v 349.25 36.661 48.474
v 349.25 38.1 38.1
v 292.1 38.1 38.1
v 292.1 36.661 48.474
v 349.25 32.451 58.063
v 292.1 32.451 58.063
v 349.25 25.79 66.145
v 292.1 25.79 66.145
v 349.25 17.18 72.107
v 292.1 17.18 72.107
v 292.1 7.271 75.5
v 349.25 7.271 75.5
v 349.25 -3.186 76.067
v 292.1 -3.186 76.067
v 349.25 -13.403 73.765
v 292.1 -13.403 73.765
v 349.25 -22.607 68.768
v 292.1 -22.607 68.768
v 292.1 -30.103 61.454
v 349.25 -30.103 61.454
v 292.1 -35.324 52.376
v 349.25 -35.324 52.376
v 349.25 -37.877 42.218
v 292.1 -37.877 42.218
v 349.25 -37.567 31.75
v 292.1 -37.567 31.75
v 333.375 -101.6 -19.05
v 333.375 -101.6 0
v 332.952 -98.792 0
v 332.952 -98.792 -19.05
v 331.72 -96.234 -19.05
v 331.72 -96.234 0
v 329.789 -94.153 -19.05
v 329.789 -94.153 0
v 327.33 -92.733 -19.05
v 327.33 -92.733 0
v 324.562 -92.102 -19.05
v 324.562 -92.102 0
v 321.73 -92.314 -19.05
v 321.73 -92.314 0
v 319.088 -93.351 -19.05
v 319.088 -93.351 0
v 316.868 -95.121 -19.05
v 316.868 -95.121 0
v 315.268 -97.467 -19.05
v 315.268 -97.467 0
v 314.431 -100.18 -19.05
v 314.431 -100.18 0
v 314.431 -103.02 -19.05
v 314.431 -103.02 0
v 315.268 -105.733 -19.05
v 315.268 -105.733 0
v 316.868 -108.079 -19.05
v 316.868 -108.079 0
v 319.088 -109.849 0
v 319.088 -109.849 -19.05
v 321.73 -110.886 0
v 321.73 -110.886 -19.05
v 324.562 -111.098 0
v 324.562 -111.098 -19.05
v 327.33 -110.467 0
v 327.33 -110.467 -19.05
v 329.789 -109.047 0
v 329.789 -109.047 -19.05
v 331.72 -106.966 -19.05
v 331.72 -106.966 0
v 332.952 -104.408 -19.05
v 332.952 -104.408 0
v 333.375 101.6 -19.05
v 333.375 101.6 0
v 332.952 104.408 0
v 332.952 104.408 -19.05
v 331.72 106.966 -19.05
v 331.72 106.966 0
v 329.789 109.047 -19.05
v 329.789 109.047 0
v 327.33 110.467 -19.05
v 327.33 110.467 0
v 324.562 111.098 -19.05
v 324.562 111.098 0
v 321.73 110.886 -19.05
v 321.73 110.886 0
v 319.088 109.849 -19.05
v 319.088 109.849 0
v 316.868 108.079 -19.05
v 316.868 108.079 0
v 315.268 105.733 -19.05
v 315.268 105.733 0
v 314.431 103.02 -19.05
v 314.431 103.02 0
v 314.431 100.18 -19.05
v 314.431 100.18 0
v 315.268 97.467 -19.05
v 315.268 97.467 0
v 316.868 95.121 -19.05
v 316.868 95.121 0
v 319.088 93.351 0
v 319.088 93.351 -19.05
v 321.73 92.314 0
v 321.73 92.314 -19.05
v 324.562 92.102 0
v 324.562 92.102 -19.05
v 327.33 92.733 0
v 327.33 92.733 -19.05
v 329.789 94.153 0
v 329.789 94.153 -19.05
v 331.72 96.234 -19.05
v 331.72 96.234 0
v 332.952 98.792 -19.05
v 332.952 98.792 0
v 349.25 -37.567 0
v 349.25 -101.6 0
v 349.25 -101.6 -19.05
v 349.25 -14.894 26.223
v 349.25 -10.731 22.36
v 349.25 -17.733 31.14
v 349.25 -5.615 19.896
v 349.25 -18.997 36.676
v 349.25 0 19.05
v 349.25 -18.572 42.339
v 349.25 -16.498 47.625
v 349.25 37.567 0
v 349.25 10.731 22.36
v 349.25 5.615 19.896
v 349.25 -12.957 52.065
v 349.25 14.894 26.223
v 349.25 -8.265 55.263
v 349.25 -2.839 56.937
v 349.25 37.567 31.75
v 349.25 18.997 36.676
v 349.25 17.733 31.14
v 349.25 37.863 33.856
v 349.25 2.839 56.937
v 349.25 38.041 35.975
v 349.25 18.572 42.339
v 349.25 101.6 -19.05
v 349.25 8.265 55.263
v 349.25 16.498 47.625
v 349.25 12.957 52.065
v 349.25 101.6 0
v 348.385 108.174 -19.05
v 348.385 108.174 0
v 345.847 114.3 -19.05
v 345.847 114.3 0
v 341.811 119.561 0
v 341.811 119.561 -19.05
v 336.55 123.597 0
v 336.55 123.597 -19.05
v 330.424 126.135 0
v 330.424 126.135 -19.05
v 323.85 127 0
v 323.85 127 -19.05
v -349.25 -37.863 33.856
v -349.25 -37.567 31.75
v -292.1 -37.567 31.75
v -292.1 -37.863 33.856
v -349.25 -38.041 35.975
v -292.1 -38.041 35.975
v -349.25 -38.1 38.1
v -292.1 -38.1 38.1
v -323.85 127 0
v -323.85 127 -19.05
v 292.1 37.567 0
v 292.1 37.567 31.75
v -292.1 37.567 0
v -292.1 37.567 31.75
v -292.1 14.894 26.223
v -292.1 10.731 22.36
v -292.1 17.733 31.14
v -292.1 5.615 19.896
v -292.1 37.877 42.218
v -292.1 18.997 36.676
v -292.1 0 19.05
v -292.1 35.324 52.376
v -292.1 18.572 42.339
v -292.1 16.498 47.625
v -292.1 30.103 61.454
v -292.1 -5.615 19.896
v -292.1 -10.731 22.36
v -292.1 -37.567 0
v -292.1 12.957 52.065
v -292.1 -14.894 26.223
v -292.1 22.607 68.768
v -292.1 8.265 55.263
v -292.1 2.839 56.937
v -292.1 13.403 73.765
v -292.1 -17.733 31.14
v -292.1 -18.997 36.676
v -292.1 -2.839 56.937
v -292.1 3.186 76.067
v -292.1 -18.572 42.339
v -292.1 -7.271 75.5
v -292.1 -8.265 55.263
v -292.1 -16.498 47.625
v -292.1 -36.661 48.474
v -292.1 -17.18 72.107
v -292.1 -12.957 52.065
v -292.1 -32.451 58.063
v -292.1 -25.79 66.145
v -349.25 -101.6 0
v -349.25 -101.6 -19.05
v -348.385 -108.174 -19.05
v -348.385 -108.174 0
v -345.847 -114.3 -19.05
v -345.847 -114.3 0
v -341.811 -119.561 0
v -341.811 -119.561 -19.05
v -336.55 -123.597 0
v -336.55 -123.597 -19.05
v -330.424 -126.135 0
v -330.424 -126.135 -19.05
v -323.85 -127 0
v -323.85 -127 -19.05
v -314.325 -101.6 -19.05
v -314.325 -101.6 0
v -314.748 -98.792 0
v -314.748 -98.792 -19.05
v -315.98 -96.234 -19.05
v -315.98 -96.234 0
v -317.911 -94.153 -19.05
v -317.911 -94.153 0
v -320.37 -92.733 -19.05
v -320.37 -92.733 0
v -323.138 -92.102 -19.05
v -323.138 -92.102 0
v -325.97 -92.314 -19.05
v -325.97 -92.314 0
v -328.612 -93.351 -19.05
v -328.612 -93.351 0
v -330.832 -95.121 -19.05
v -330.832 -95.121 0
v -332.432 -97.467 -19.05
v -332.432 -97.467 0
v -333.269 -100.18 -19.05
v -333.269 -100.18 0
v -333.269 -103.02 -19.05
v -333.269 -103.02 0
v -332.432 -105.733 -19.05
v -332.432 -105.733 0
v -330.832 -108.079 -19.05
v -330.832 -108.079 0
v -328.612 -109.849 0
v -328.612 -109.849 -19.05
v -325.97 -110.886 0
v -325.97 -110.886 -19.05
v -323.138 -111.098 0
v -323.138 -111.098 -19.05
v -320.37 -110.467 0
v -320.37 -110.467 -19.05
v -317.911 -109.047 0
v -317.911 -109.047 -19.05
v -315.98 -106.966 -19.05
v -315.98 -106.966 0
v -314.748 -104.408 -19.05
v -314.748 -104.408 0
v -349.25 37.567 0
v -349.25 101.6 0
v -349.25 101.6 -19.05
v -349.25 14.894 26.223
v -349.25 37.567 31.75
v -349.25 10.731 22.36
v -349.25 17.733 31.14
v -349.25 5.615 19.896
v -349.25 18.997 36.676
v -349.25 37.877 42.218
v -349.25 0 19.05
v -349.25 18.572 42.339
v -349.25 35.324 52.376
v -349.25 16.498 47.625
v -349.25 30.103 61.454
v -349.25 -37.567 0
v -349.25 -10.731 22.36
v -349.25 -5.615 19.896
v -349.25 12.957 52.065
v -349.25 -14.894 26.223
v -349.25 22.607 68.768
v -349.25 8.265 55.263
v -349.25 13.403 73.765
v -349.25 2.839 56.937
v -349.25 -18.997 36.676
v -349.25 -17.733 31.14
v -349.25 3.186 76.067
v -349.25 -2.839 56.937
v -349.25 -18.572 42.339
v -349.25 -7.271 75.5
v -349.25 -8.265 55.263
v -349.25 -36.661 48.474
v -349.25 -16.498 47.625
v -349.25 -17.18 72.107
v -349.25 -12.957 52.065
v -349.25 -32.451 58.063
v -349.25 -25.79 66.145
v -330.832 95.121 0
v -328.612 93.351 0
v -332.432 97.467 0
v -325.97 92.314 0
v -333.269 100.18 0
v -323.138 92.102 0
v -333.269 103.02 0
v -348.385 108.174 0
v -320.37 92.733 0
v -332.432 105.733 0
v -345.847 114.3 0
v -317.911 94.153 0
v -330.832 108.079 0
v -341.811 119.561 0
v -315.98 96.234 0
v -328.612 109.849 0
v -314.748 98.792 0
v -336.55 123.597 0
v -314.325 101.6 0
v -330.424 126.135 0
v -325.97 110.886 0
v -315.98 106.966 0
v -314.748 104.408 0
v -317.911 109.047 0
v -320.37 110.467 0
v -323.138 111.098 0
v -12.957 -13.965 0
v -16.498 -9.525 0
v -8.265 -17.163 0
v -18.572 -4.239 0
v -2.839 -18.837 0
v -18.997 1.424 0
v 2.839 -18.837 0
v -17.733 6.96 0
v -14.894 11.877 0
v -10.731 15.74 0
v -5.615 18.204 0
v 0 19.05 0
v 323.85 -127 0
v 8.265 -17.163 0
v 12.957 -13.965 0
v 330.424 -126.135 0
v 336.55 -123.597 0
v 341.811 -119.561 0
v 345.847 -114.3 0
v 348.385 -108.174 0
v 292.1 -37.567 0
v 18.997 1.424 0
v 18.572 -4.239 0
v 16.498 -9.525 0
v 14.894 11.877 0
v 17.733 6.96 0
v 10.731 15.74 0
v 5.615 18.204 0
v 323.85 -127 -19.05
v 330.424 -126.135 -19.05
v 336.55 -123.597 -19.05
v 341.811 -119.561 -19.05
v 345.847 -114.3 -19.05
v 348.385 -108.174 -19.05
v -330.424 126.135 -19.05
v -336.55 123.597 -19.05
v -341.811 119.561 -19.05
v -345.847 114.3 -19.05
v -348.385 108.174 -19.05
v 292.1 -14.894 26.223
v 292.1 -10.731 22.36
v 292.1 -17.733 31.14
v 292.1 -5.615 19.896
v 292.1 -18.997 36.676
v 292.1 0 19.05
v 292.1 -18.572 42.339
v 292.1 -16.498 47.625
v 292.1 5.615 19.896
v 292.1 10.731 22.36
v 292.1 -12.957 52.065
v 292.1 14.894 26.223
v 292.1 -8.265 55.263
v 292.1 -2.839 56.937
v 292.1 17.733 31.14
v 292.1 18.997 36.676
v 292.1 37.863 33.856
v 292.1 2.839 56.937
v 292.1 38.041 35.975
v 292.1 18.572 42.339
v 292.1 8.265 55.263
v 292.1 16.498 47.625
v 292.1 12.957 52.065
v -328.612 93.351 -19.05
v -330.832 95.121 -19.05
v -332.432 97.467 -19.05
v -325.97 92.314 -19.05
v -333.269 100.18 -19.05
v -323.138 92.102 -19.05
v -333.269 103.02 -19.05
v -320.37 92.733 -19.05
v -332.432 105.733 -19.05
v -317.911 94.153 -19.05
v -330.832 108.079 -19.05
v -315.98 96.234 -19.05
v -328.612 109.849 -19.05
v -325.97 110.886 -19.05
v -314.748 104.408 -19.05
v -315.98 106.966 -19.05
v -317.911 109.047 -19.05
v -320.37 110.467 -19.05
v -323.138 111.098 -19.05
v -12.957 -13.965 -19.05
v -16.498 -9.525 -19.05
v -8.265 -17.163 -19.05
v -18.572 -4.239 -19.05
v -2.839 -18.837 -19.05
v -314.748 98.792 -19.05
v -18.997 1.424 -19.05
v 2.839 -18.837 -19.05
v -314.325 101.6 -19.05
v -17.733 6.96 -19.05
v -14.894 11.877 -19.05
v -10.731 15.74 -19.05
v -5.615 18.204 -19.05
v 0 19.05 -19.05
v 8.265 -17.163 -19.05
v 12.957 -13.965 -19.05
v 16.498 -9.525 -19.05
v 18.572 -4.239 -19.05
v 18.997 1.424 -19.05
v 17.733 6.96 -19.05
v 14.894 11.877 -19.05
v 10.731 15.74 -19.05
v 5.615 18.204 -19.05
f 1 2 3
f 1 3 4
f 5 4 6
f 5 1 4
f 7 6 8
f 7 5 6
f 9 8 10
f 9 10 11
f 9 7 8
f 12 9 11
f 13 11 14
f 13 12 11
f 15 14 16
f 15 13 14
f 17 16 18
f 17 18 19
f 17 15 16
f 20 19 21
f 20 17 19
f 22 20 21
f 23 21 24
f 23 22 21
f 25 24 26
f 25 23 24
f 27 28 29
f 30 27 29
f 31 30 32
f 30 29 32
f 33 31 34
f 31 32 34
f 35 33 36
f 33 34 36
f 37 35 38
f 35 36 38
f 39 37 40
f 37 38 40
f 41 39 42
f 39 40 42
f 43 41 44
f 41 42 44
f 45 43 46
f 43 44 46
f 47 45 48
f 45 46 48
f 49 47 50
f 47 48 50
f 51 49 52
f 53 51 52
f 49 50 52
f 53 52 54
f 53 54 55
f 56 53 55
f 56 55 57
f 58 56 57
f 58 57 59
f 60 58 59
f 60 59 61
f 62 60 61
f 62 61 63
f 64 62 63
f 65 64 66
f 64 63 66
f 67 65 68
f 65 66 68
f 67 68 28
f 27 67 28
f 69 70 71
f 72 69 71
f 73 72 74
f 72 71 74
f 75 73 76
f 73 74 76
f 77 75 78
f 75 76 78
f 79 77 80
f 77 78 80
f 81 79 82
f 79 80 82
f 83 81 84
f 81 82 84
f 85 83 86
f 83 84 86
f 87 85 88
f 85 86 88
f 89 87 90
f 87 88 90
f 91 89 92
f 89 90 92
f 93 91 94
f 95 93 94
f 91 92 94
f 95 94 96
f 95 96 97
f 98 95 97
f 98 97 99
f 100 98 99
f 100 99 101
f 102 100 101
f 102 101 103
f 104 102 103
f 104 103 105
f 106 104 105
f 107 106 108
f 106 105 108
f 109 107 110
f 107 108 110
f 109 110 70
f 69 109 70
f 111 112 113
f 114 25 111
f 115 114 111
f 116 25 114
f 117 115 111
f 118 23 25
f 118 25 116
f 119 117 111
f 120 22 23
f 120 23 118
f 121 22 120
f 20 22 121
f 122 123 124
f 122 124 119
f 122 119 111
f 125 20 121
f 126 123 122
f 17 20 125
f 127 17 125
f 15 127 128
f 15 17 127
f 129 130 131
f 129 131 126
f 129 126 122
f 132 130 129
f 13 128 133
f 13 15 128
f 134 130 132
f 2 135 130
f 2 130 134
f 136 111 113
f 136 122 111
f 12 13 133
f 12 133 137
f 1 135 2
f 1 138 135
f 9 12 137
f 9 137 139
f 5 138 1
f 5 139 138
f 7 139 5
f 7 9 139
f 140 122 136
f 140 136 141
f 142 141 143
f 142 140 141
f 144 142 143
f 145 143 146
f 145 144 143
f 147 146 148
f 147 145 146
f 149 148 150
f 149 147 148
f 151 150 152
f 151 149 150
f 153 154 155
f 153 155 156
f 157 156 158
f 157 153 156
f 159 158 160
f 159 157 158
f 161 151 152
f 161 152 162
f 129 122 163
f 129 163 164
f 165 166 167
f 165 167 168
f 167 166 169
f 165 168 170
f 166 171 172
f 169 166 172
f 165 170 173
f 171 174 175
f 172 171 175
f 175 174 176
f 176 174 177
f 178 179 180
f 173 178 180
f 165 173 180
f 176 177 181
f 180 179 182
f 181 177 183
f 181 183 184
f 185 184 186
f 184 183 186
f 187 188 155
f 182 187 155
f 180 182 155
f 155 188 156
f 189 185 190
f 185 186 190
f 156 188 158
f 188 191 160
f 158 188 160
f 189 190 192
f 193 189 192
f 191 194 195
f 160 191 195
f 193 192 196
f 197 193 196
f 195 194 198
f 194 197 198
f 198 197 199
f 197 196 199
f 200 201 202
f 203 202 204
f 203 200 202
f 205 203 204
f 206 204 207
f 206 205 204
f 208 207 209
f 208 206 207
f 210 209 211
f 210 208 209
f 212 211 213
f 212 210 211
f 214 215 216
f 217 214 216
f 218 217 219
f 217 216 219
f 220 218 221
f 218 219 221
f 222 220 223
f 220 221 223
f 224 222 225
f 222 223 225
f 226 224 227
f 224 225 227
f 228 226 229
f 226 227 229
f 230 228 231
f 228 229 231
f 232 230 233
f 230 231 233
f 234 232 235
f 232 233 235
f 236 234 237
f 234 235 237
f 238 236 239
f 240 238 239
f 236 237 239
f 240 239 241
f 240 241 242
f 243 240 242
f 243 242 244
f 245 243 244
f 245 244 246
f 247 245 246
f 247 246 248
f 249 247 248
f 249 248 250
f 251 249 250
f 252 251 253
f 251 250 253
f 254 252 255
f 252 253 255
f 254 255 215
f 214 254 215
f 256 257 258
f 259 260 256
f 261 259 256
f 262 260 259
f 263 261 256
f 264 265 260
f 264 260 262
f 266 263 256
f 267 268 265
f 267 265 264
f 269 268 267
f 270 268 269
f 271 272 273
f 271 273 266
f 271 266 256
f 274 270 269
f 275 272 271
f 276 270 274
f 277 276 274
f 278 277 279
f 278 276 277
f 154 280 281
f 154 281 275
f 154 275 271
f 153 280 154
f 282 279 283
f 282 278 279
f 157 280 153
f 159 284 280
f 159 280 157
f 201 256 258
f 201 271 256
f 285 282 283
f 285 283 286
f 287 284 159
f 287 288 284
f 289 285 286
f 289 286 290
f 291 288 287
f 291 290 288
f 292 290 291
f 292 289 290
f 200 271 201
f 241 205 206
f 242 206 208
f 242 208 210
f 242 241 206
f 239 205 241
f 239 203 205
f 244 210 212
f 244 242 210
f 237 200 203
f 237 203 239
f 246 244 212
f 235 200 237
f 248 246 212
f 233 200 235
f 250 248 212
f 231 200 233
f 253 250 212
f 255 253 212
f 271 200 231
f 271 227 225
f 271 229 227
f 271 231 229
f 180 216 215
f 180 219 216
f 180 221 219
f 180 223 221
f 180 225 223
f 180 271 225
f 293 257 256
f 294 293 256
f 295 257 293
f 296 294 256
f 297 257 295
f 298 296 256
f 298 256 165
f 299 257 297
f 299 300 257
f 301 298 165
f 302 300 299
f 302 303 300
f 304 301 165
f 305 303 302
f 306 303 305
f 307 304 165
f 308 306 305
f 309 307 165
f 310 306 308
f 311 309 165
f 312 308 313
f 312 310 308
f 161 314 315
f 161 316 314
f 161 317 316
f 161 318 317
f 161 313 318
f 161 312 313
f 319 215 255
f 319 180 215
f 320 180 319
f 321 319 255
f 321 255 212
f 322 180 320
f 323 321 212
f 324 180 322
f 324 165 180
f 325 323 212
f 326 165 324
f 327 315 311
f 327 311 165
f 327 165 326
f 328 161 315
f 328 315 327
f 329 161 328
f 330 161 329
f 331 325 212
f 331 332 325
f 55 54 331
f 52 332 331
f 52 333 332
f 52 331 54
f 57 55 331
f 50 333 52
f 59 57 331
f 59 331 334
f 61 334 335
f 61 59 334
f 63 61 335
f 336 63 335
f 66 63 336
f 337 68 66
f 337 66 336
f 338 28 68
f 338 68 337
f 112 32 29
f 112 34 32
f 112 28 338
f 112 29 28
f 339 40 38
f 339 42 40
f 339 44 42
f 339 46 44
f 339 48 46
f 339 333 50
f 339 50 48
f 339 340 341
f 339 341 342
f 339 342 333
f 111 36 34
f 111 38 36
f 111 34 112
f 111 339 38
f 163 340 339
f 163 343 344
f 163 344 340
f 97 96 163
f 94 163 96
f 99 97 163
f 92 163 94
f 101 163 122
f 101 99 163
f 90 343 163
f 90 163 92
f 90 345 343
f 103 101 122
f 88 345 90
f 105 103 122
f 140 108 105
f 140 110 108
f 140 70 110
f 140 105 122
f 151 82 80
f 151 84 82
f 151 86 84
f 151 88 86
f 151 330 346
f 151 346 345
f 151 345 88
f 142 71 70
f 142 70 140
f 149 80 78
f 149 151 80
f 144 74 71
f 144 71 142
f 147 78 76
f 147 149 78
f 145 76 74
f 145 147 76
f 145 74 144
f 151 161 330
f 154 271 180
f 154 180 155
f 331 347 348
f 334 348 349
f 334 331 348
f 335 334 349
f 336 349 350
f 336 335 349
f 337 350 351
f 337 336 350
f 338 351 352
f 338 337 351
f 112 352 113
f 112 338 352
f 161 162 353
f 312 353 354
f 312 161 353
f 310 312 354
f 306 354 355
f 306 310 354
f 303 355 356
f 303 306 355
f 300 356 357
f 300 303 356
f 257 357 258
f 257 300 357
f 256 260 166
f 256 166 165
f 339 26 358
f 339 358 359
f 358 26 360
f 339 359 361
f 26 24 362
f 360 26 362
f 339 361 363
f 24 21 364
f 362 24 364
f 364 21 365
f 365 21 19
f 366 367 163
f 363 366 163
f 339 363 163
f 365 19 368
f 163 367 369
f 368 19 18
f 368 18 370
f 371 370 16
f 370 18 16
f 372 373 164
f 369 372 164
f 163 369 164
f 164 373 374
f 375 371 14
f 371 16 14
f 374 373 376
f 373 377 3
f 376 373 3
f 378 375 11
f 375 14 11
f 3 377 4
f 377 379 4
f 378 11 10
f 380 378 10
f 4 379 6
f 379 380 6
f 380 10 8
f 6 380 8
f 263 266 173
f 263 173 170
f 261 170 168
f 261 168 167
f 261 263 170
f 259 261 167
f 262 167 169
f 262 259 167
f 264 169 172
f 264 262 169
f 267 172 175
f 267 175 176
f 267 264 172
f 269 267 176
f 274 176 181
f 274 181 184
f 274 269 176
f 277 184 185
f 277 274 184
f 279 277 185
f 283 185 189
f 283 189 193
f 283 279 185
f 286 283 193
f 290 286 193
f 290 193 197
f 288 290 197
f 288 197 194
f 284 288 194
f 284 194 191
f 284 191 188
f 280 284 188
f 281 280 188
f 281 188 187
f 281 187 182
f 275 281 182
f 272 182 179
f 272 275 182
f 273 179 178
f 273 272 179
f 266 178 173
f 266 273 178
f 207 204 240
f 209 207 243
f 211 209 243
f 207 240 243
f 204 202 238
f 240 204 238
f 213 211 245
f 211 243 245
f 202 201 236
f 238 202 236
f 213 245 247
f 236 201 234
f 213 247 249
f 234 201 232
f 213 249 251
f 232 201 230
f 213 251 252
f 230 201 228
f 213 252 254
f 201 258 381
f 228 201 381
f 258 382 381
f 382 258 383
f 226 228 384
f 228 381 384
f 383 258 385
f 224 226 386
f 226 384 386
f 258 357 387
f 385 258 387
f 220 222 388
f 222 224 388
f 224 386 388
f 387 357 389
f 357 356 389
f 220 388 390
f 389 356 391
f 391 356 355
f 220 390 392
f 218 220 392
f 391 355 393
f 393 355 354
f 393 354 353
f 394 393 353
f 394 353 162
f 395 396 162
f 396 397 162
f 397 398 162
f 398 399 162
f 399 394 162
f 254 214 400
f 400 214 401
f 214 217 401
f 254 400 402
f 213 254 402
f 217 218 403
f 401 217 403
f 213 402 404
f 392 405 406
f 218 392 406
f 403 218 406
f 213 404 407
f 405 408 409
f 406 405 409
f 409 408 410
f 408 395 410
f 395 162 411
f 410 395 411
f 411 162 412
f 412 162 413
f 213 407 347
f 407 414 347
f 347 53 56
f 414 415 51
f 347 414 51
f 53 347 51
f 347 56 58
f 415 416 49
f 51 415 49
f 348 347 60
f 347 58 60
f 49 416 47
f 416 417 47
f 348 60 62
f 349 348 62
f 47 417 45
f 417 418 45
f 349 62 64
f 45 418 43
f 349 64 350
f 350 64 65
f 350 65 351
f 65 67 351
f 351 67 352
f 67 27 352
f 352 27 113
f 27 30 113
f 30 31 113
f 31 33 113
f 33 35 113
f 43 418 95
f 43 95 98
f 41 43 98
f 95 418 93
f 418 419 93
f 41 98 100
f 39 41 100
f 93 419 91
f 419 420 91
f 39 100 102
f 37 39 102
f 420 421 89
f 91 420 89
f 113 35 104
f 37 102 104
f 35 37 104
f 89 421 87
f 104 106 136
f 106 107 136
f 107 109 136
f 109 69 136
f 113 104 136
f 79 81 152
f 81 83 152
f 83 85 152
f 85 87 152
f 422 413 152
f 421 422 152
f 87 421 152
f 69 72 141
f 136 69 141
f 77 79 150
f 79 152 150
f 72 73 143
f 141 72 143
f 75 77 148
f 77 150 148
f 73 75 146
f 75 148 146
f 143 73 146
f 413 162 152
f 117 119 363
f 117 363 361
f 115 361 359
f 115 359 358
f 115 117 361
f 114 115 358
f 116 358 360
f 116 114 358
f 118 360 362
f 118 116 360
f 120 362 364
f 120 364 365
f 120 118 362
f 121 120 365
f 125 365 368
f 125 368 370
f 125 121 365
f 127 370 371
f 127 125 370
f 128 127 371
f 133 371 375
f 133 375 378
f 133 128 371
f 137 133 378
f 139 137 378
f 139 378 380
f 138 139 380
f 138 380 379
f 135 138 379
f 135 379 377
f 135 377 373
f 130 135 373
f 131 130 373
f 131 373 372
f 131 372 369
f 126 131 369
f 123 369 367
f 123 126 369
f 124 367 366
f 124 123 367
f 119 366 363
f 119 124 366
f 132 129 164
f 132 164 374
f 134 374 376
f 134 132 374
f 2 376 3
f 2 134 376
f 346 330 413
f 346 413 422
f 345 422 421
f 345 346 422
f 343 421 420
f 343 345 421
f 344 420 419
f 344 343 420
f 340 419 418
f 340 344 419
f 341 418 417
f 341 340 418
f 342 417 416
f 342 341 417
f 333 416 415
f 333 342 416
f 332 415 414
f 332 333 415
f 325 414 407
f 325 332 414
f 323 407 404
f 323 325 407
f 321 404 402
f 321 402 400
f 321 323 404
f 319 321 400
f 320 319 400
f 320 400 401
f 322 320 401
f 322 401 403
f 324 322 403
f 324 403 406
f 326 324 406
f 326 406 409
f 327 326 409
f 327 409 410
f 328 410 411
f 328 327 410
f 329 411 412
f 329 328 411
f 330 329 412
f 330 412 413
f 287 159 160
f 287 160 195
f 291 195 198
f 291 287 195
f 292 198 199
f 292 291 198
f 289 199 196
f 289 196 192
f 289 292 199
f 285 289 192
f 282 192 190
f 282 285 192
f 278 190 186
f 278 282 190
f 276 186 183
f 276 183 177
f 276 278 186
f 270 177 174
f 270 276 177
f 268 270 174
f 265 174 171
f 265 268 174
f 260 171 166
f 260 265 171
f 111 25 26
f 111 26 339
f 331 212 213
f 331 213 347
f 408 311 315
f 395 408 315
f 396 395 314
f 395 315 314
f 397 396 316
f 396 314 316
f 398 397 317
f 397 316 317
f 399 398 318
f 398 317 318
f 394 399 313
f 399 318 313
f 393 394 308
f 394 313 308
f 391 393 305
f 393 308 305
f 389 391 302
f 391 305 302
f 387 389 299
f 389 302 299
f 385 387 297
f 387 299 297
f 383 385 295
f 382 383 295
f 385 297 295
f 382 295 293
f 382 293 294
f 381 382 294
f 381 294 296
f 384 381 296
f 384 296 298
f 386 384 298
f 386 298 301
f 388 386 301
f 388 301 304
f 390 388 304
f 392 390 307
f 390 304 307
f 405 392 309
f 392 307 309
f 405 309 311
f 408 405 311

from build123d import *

# Parameters (mm, degrees)
F0_R     = 9.525
F1_DEPTH = 19.05
F3_DEPTH = 57.15
F5_DEPTH = 57.15


with BuildPart() as f1:
    # F0 (on Top) → F1 (new body)
    with BuildSketch(Plane.XY):
        with BuildLine():
            Line((349.25, 0), (19.05, 0))
            ThreePointArc((19.05, 0), (-13.4703841816, -13.4703841816), (0, 19.05))
            Line((0, 19.05), (0, 127))
            Line((0, 127), (-323.85, 127))
            ThreePointArc((-323.85, 127), (-341.8105122421, 119.5605122421), (-349.25, 101.6))
            Line((-349.25, 101.6), (-349.25, -101.6))
            ThreePointArc((-349.25, -101.6), (-341.8105122421, -119.5605122421), (-323.85, -127))
            Line((-323.85, -127), (323.85, -127))
            ThreePointArc((323.85, -127), (341.8105122421, -119.5605122421), (349.25, -101.6))
            Line((349.25, -101.6), (349.25, 0))
        make_face()
        with Locations((-323.85, -101.6)):
            Circle(F0_R, mode=Mode.SUBTRACT)
        with Locations((323.85, -101.6)):
            Circle(F0_R, mode=Mode.SUBTRACT)
        with Locations((-323.85, 101.6)):
            Circle(F0_R, mode=Mode.SUBTRACT)
        with BuildLine():
            ThreePointArc((0, 19.05), (13.4703841816, 13.4703841816), (19.05, 0))
            Line((19.05, 0), (349.25, 0))
            Line((349.25, 0), (349.25, 101.6))
            ThreePointArc((349.25, 101.6), (341.8105122421, 119.5605122421), (323.85, 127))
            Line((323.85, 127), (0, 127))
            Line((0, 127), (0, 19.05))
        make_face()
        with Locations((323.85, 101.6)):
            Circle(F0_R, mode=Mode.SUBTRACT)
    extrude(amount=-F1_DEPTH)

    # F2 (on face) → F3 (join)
    with BuildSketch(Plane(origin=(-349.25, 0, 0), x_dir=(0, -1, 0), z_dir=(-1, 0, 0))):
        with BuildLine():
            ThreePointArc((-37.5671066227, 31.75), (-24.5934442418, 9.0006443314), (1.73e-08, 0))
            ThreePointArc((1.73e-08, 0), (24.593444255, 9.0006443426), (37.5671066227, 31.75))
            ThreePointArc((37.5671066227, 31.75), (37.9665429182, 34.9138394833), (38.1, 38.1))
            ThreePointArc((38.1, 38.1), (-3.1861605167, 76.0665429182), (-37.5671066227, 31.75))
        make_face()
        with BuildLine():
            ThreePointArc((19.05, 38.1), (13.4703841816, 24.6296158184), (0, 19.05))
            ThreePointArc((0, 19.05), (-13.4703841816, 51.5703841816), (19.05, 38.1))
        make_face(mode=Mode.SUBTRACT)
        with BuildLine():
            Line((-37.5671066227, 0), (1.73e-08, 0))
            ThreePointArc((1.73e-08, 0), (-24.5934442418, 9.0006443314), (-37.5671066227, 31.75))
            Line((-37.5671066227, 31.75), (-37.5671066227, 0))
        make_face()
        with BuildLine():
            ThreePointArc((37.5671066227, 31.75), (24.593444255, 9.0006443426), (1.73e-08, 0))
            Line((1.73e-08, 0), (37.5671066227, 0))
            Line((37.5671066227, 0), (37.5671066227, 31.75))
        make_face()
    extrude(amount=-F3_DEPTH)

    # F4 (on face) → F5 (join)
    with BuildSketch(Plane.YZ.offset(349.25)):
        with BuildLine():
            ThreePointArc((37.5671066227, 31.75), (24.593444255, 9.0006443426), (1.73e-08, 0))
            Line((1.73e-08, 0), (37.5671066227, 0))
            Line((37.5671066227, 0), (37.5671066227, 31.75))
        make_face()
        with BuildLine():
            ThreePointArc((-37.5671066227, 31.75), (-24.5934442418, 9.0006443314), (1.73e-08, 0))
            ThreePointArc((1.73e-08, 0), (24.593444255, 9.0006443426), (37.5671066227, 31.75))
            ThreePointArc((37.5671066227, 31.75), (37.9665429182, 34.9138394833), (38.1, 38.1))
            ThreePointArc((38.1, 38.1), (-3.1861605167, 76.0665429182), (-37.5671066227, 31.75))
        make_face()
        with BuildLine():
            ThreePointArc((19.05, 38.1), (13.4703841816, 24.6296158184), (0, 19.05))
            ThreePointArc((0, 19.05), (-13.4703841816, 51.5703841816), (19.05, 38.1))
        make_face(mode=Mode.SUBTRACT)
        with BuildLine():
            Line((-37.5671066227, 0), (1.73e-08, 0))
            ThreePointArc((1.73e-08, 0), (-24.5934442418, 9.0006443314), (-37.5671066227, 31.75))
            Line((-37.5671066227, 31.75), (-37.5671066227, 0))
        make_face()
    extrude(amount=-F5_DEPTH)


solid = f1.part
